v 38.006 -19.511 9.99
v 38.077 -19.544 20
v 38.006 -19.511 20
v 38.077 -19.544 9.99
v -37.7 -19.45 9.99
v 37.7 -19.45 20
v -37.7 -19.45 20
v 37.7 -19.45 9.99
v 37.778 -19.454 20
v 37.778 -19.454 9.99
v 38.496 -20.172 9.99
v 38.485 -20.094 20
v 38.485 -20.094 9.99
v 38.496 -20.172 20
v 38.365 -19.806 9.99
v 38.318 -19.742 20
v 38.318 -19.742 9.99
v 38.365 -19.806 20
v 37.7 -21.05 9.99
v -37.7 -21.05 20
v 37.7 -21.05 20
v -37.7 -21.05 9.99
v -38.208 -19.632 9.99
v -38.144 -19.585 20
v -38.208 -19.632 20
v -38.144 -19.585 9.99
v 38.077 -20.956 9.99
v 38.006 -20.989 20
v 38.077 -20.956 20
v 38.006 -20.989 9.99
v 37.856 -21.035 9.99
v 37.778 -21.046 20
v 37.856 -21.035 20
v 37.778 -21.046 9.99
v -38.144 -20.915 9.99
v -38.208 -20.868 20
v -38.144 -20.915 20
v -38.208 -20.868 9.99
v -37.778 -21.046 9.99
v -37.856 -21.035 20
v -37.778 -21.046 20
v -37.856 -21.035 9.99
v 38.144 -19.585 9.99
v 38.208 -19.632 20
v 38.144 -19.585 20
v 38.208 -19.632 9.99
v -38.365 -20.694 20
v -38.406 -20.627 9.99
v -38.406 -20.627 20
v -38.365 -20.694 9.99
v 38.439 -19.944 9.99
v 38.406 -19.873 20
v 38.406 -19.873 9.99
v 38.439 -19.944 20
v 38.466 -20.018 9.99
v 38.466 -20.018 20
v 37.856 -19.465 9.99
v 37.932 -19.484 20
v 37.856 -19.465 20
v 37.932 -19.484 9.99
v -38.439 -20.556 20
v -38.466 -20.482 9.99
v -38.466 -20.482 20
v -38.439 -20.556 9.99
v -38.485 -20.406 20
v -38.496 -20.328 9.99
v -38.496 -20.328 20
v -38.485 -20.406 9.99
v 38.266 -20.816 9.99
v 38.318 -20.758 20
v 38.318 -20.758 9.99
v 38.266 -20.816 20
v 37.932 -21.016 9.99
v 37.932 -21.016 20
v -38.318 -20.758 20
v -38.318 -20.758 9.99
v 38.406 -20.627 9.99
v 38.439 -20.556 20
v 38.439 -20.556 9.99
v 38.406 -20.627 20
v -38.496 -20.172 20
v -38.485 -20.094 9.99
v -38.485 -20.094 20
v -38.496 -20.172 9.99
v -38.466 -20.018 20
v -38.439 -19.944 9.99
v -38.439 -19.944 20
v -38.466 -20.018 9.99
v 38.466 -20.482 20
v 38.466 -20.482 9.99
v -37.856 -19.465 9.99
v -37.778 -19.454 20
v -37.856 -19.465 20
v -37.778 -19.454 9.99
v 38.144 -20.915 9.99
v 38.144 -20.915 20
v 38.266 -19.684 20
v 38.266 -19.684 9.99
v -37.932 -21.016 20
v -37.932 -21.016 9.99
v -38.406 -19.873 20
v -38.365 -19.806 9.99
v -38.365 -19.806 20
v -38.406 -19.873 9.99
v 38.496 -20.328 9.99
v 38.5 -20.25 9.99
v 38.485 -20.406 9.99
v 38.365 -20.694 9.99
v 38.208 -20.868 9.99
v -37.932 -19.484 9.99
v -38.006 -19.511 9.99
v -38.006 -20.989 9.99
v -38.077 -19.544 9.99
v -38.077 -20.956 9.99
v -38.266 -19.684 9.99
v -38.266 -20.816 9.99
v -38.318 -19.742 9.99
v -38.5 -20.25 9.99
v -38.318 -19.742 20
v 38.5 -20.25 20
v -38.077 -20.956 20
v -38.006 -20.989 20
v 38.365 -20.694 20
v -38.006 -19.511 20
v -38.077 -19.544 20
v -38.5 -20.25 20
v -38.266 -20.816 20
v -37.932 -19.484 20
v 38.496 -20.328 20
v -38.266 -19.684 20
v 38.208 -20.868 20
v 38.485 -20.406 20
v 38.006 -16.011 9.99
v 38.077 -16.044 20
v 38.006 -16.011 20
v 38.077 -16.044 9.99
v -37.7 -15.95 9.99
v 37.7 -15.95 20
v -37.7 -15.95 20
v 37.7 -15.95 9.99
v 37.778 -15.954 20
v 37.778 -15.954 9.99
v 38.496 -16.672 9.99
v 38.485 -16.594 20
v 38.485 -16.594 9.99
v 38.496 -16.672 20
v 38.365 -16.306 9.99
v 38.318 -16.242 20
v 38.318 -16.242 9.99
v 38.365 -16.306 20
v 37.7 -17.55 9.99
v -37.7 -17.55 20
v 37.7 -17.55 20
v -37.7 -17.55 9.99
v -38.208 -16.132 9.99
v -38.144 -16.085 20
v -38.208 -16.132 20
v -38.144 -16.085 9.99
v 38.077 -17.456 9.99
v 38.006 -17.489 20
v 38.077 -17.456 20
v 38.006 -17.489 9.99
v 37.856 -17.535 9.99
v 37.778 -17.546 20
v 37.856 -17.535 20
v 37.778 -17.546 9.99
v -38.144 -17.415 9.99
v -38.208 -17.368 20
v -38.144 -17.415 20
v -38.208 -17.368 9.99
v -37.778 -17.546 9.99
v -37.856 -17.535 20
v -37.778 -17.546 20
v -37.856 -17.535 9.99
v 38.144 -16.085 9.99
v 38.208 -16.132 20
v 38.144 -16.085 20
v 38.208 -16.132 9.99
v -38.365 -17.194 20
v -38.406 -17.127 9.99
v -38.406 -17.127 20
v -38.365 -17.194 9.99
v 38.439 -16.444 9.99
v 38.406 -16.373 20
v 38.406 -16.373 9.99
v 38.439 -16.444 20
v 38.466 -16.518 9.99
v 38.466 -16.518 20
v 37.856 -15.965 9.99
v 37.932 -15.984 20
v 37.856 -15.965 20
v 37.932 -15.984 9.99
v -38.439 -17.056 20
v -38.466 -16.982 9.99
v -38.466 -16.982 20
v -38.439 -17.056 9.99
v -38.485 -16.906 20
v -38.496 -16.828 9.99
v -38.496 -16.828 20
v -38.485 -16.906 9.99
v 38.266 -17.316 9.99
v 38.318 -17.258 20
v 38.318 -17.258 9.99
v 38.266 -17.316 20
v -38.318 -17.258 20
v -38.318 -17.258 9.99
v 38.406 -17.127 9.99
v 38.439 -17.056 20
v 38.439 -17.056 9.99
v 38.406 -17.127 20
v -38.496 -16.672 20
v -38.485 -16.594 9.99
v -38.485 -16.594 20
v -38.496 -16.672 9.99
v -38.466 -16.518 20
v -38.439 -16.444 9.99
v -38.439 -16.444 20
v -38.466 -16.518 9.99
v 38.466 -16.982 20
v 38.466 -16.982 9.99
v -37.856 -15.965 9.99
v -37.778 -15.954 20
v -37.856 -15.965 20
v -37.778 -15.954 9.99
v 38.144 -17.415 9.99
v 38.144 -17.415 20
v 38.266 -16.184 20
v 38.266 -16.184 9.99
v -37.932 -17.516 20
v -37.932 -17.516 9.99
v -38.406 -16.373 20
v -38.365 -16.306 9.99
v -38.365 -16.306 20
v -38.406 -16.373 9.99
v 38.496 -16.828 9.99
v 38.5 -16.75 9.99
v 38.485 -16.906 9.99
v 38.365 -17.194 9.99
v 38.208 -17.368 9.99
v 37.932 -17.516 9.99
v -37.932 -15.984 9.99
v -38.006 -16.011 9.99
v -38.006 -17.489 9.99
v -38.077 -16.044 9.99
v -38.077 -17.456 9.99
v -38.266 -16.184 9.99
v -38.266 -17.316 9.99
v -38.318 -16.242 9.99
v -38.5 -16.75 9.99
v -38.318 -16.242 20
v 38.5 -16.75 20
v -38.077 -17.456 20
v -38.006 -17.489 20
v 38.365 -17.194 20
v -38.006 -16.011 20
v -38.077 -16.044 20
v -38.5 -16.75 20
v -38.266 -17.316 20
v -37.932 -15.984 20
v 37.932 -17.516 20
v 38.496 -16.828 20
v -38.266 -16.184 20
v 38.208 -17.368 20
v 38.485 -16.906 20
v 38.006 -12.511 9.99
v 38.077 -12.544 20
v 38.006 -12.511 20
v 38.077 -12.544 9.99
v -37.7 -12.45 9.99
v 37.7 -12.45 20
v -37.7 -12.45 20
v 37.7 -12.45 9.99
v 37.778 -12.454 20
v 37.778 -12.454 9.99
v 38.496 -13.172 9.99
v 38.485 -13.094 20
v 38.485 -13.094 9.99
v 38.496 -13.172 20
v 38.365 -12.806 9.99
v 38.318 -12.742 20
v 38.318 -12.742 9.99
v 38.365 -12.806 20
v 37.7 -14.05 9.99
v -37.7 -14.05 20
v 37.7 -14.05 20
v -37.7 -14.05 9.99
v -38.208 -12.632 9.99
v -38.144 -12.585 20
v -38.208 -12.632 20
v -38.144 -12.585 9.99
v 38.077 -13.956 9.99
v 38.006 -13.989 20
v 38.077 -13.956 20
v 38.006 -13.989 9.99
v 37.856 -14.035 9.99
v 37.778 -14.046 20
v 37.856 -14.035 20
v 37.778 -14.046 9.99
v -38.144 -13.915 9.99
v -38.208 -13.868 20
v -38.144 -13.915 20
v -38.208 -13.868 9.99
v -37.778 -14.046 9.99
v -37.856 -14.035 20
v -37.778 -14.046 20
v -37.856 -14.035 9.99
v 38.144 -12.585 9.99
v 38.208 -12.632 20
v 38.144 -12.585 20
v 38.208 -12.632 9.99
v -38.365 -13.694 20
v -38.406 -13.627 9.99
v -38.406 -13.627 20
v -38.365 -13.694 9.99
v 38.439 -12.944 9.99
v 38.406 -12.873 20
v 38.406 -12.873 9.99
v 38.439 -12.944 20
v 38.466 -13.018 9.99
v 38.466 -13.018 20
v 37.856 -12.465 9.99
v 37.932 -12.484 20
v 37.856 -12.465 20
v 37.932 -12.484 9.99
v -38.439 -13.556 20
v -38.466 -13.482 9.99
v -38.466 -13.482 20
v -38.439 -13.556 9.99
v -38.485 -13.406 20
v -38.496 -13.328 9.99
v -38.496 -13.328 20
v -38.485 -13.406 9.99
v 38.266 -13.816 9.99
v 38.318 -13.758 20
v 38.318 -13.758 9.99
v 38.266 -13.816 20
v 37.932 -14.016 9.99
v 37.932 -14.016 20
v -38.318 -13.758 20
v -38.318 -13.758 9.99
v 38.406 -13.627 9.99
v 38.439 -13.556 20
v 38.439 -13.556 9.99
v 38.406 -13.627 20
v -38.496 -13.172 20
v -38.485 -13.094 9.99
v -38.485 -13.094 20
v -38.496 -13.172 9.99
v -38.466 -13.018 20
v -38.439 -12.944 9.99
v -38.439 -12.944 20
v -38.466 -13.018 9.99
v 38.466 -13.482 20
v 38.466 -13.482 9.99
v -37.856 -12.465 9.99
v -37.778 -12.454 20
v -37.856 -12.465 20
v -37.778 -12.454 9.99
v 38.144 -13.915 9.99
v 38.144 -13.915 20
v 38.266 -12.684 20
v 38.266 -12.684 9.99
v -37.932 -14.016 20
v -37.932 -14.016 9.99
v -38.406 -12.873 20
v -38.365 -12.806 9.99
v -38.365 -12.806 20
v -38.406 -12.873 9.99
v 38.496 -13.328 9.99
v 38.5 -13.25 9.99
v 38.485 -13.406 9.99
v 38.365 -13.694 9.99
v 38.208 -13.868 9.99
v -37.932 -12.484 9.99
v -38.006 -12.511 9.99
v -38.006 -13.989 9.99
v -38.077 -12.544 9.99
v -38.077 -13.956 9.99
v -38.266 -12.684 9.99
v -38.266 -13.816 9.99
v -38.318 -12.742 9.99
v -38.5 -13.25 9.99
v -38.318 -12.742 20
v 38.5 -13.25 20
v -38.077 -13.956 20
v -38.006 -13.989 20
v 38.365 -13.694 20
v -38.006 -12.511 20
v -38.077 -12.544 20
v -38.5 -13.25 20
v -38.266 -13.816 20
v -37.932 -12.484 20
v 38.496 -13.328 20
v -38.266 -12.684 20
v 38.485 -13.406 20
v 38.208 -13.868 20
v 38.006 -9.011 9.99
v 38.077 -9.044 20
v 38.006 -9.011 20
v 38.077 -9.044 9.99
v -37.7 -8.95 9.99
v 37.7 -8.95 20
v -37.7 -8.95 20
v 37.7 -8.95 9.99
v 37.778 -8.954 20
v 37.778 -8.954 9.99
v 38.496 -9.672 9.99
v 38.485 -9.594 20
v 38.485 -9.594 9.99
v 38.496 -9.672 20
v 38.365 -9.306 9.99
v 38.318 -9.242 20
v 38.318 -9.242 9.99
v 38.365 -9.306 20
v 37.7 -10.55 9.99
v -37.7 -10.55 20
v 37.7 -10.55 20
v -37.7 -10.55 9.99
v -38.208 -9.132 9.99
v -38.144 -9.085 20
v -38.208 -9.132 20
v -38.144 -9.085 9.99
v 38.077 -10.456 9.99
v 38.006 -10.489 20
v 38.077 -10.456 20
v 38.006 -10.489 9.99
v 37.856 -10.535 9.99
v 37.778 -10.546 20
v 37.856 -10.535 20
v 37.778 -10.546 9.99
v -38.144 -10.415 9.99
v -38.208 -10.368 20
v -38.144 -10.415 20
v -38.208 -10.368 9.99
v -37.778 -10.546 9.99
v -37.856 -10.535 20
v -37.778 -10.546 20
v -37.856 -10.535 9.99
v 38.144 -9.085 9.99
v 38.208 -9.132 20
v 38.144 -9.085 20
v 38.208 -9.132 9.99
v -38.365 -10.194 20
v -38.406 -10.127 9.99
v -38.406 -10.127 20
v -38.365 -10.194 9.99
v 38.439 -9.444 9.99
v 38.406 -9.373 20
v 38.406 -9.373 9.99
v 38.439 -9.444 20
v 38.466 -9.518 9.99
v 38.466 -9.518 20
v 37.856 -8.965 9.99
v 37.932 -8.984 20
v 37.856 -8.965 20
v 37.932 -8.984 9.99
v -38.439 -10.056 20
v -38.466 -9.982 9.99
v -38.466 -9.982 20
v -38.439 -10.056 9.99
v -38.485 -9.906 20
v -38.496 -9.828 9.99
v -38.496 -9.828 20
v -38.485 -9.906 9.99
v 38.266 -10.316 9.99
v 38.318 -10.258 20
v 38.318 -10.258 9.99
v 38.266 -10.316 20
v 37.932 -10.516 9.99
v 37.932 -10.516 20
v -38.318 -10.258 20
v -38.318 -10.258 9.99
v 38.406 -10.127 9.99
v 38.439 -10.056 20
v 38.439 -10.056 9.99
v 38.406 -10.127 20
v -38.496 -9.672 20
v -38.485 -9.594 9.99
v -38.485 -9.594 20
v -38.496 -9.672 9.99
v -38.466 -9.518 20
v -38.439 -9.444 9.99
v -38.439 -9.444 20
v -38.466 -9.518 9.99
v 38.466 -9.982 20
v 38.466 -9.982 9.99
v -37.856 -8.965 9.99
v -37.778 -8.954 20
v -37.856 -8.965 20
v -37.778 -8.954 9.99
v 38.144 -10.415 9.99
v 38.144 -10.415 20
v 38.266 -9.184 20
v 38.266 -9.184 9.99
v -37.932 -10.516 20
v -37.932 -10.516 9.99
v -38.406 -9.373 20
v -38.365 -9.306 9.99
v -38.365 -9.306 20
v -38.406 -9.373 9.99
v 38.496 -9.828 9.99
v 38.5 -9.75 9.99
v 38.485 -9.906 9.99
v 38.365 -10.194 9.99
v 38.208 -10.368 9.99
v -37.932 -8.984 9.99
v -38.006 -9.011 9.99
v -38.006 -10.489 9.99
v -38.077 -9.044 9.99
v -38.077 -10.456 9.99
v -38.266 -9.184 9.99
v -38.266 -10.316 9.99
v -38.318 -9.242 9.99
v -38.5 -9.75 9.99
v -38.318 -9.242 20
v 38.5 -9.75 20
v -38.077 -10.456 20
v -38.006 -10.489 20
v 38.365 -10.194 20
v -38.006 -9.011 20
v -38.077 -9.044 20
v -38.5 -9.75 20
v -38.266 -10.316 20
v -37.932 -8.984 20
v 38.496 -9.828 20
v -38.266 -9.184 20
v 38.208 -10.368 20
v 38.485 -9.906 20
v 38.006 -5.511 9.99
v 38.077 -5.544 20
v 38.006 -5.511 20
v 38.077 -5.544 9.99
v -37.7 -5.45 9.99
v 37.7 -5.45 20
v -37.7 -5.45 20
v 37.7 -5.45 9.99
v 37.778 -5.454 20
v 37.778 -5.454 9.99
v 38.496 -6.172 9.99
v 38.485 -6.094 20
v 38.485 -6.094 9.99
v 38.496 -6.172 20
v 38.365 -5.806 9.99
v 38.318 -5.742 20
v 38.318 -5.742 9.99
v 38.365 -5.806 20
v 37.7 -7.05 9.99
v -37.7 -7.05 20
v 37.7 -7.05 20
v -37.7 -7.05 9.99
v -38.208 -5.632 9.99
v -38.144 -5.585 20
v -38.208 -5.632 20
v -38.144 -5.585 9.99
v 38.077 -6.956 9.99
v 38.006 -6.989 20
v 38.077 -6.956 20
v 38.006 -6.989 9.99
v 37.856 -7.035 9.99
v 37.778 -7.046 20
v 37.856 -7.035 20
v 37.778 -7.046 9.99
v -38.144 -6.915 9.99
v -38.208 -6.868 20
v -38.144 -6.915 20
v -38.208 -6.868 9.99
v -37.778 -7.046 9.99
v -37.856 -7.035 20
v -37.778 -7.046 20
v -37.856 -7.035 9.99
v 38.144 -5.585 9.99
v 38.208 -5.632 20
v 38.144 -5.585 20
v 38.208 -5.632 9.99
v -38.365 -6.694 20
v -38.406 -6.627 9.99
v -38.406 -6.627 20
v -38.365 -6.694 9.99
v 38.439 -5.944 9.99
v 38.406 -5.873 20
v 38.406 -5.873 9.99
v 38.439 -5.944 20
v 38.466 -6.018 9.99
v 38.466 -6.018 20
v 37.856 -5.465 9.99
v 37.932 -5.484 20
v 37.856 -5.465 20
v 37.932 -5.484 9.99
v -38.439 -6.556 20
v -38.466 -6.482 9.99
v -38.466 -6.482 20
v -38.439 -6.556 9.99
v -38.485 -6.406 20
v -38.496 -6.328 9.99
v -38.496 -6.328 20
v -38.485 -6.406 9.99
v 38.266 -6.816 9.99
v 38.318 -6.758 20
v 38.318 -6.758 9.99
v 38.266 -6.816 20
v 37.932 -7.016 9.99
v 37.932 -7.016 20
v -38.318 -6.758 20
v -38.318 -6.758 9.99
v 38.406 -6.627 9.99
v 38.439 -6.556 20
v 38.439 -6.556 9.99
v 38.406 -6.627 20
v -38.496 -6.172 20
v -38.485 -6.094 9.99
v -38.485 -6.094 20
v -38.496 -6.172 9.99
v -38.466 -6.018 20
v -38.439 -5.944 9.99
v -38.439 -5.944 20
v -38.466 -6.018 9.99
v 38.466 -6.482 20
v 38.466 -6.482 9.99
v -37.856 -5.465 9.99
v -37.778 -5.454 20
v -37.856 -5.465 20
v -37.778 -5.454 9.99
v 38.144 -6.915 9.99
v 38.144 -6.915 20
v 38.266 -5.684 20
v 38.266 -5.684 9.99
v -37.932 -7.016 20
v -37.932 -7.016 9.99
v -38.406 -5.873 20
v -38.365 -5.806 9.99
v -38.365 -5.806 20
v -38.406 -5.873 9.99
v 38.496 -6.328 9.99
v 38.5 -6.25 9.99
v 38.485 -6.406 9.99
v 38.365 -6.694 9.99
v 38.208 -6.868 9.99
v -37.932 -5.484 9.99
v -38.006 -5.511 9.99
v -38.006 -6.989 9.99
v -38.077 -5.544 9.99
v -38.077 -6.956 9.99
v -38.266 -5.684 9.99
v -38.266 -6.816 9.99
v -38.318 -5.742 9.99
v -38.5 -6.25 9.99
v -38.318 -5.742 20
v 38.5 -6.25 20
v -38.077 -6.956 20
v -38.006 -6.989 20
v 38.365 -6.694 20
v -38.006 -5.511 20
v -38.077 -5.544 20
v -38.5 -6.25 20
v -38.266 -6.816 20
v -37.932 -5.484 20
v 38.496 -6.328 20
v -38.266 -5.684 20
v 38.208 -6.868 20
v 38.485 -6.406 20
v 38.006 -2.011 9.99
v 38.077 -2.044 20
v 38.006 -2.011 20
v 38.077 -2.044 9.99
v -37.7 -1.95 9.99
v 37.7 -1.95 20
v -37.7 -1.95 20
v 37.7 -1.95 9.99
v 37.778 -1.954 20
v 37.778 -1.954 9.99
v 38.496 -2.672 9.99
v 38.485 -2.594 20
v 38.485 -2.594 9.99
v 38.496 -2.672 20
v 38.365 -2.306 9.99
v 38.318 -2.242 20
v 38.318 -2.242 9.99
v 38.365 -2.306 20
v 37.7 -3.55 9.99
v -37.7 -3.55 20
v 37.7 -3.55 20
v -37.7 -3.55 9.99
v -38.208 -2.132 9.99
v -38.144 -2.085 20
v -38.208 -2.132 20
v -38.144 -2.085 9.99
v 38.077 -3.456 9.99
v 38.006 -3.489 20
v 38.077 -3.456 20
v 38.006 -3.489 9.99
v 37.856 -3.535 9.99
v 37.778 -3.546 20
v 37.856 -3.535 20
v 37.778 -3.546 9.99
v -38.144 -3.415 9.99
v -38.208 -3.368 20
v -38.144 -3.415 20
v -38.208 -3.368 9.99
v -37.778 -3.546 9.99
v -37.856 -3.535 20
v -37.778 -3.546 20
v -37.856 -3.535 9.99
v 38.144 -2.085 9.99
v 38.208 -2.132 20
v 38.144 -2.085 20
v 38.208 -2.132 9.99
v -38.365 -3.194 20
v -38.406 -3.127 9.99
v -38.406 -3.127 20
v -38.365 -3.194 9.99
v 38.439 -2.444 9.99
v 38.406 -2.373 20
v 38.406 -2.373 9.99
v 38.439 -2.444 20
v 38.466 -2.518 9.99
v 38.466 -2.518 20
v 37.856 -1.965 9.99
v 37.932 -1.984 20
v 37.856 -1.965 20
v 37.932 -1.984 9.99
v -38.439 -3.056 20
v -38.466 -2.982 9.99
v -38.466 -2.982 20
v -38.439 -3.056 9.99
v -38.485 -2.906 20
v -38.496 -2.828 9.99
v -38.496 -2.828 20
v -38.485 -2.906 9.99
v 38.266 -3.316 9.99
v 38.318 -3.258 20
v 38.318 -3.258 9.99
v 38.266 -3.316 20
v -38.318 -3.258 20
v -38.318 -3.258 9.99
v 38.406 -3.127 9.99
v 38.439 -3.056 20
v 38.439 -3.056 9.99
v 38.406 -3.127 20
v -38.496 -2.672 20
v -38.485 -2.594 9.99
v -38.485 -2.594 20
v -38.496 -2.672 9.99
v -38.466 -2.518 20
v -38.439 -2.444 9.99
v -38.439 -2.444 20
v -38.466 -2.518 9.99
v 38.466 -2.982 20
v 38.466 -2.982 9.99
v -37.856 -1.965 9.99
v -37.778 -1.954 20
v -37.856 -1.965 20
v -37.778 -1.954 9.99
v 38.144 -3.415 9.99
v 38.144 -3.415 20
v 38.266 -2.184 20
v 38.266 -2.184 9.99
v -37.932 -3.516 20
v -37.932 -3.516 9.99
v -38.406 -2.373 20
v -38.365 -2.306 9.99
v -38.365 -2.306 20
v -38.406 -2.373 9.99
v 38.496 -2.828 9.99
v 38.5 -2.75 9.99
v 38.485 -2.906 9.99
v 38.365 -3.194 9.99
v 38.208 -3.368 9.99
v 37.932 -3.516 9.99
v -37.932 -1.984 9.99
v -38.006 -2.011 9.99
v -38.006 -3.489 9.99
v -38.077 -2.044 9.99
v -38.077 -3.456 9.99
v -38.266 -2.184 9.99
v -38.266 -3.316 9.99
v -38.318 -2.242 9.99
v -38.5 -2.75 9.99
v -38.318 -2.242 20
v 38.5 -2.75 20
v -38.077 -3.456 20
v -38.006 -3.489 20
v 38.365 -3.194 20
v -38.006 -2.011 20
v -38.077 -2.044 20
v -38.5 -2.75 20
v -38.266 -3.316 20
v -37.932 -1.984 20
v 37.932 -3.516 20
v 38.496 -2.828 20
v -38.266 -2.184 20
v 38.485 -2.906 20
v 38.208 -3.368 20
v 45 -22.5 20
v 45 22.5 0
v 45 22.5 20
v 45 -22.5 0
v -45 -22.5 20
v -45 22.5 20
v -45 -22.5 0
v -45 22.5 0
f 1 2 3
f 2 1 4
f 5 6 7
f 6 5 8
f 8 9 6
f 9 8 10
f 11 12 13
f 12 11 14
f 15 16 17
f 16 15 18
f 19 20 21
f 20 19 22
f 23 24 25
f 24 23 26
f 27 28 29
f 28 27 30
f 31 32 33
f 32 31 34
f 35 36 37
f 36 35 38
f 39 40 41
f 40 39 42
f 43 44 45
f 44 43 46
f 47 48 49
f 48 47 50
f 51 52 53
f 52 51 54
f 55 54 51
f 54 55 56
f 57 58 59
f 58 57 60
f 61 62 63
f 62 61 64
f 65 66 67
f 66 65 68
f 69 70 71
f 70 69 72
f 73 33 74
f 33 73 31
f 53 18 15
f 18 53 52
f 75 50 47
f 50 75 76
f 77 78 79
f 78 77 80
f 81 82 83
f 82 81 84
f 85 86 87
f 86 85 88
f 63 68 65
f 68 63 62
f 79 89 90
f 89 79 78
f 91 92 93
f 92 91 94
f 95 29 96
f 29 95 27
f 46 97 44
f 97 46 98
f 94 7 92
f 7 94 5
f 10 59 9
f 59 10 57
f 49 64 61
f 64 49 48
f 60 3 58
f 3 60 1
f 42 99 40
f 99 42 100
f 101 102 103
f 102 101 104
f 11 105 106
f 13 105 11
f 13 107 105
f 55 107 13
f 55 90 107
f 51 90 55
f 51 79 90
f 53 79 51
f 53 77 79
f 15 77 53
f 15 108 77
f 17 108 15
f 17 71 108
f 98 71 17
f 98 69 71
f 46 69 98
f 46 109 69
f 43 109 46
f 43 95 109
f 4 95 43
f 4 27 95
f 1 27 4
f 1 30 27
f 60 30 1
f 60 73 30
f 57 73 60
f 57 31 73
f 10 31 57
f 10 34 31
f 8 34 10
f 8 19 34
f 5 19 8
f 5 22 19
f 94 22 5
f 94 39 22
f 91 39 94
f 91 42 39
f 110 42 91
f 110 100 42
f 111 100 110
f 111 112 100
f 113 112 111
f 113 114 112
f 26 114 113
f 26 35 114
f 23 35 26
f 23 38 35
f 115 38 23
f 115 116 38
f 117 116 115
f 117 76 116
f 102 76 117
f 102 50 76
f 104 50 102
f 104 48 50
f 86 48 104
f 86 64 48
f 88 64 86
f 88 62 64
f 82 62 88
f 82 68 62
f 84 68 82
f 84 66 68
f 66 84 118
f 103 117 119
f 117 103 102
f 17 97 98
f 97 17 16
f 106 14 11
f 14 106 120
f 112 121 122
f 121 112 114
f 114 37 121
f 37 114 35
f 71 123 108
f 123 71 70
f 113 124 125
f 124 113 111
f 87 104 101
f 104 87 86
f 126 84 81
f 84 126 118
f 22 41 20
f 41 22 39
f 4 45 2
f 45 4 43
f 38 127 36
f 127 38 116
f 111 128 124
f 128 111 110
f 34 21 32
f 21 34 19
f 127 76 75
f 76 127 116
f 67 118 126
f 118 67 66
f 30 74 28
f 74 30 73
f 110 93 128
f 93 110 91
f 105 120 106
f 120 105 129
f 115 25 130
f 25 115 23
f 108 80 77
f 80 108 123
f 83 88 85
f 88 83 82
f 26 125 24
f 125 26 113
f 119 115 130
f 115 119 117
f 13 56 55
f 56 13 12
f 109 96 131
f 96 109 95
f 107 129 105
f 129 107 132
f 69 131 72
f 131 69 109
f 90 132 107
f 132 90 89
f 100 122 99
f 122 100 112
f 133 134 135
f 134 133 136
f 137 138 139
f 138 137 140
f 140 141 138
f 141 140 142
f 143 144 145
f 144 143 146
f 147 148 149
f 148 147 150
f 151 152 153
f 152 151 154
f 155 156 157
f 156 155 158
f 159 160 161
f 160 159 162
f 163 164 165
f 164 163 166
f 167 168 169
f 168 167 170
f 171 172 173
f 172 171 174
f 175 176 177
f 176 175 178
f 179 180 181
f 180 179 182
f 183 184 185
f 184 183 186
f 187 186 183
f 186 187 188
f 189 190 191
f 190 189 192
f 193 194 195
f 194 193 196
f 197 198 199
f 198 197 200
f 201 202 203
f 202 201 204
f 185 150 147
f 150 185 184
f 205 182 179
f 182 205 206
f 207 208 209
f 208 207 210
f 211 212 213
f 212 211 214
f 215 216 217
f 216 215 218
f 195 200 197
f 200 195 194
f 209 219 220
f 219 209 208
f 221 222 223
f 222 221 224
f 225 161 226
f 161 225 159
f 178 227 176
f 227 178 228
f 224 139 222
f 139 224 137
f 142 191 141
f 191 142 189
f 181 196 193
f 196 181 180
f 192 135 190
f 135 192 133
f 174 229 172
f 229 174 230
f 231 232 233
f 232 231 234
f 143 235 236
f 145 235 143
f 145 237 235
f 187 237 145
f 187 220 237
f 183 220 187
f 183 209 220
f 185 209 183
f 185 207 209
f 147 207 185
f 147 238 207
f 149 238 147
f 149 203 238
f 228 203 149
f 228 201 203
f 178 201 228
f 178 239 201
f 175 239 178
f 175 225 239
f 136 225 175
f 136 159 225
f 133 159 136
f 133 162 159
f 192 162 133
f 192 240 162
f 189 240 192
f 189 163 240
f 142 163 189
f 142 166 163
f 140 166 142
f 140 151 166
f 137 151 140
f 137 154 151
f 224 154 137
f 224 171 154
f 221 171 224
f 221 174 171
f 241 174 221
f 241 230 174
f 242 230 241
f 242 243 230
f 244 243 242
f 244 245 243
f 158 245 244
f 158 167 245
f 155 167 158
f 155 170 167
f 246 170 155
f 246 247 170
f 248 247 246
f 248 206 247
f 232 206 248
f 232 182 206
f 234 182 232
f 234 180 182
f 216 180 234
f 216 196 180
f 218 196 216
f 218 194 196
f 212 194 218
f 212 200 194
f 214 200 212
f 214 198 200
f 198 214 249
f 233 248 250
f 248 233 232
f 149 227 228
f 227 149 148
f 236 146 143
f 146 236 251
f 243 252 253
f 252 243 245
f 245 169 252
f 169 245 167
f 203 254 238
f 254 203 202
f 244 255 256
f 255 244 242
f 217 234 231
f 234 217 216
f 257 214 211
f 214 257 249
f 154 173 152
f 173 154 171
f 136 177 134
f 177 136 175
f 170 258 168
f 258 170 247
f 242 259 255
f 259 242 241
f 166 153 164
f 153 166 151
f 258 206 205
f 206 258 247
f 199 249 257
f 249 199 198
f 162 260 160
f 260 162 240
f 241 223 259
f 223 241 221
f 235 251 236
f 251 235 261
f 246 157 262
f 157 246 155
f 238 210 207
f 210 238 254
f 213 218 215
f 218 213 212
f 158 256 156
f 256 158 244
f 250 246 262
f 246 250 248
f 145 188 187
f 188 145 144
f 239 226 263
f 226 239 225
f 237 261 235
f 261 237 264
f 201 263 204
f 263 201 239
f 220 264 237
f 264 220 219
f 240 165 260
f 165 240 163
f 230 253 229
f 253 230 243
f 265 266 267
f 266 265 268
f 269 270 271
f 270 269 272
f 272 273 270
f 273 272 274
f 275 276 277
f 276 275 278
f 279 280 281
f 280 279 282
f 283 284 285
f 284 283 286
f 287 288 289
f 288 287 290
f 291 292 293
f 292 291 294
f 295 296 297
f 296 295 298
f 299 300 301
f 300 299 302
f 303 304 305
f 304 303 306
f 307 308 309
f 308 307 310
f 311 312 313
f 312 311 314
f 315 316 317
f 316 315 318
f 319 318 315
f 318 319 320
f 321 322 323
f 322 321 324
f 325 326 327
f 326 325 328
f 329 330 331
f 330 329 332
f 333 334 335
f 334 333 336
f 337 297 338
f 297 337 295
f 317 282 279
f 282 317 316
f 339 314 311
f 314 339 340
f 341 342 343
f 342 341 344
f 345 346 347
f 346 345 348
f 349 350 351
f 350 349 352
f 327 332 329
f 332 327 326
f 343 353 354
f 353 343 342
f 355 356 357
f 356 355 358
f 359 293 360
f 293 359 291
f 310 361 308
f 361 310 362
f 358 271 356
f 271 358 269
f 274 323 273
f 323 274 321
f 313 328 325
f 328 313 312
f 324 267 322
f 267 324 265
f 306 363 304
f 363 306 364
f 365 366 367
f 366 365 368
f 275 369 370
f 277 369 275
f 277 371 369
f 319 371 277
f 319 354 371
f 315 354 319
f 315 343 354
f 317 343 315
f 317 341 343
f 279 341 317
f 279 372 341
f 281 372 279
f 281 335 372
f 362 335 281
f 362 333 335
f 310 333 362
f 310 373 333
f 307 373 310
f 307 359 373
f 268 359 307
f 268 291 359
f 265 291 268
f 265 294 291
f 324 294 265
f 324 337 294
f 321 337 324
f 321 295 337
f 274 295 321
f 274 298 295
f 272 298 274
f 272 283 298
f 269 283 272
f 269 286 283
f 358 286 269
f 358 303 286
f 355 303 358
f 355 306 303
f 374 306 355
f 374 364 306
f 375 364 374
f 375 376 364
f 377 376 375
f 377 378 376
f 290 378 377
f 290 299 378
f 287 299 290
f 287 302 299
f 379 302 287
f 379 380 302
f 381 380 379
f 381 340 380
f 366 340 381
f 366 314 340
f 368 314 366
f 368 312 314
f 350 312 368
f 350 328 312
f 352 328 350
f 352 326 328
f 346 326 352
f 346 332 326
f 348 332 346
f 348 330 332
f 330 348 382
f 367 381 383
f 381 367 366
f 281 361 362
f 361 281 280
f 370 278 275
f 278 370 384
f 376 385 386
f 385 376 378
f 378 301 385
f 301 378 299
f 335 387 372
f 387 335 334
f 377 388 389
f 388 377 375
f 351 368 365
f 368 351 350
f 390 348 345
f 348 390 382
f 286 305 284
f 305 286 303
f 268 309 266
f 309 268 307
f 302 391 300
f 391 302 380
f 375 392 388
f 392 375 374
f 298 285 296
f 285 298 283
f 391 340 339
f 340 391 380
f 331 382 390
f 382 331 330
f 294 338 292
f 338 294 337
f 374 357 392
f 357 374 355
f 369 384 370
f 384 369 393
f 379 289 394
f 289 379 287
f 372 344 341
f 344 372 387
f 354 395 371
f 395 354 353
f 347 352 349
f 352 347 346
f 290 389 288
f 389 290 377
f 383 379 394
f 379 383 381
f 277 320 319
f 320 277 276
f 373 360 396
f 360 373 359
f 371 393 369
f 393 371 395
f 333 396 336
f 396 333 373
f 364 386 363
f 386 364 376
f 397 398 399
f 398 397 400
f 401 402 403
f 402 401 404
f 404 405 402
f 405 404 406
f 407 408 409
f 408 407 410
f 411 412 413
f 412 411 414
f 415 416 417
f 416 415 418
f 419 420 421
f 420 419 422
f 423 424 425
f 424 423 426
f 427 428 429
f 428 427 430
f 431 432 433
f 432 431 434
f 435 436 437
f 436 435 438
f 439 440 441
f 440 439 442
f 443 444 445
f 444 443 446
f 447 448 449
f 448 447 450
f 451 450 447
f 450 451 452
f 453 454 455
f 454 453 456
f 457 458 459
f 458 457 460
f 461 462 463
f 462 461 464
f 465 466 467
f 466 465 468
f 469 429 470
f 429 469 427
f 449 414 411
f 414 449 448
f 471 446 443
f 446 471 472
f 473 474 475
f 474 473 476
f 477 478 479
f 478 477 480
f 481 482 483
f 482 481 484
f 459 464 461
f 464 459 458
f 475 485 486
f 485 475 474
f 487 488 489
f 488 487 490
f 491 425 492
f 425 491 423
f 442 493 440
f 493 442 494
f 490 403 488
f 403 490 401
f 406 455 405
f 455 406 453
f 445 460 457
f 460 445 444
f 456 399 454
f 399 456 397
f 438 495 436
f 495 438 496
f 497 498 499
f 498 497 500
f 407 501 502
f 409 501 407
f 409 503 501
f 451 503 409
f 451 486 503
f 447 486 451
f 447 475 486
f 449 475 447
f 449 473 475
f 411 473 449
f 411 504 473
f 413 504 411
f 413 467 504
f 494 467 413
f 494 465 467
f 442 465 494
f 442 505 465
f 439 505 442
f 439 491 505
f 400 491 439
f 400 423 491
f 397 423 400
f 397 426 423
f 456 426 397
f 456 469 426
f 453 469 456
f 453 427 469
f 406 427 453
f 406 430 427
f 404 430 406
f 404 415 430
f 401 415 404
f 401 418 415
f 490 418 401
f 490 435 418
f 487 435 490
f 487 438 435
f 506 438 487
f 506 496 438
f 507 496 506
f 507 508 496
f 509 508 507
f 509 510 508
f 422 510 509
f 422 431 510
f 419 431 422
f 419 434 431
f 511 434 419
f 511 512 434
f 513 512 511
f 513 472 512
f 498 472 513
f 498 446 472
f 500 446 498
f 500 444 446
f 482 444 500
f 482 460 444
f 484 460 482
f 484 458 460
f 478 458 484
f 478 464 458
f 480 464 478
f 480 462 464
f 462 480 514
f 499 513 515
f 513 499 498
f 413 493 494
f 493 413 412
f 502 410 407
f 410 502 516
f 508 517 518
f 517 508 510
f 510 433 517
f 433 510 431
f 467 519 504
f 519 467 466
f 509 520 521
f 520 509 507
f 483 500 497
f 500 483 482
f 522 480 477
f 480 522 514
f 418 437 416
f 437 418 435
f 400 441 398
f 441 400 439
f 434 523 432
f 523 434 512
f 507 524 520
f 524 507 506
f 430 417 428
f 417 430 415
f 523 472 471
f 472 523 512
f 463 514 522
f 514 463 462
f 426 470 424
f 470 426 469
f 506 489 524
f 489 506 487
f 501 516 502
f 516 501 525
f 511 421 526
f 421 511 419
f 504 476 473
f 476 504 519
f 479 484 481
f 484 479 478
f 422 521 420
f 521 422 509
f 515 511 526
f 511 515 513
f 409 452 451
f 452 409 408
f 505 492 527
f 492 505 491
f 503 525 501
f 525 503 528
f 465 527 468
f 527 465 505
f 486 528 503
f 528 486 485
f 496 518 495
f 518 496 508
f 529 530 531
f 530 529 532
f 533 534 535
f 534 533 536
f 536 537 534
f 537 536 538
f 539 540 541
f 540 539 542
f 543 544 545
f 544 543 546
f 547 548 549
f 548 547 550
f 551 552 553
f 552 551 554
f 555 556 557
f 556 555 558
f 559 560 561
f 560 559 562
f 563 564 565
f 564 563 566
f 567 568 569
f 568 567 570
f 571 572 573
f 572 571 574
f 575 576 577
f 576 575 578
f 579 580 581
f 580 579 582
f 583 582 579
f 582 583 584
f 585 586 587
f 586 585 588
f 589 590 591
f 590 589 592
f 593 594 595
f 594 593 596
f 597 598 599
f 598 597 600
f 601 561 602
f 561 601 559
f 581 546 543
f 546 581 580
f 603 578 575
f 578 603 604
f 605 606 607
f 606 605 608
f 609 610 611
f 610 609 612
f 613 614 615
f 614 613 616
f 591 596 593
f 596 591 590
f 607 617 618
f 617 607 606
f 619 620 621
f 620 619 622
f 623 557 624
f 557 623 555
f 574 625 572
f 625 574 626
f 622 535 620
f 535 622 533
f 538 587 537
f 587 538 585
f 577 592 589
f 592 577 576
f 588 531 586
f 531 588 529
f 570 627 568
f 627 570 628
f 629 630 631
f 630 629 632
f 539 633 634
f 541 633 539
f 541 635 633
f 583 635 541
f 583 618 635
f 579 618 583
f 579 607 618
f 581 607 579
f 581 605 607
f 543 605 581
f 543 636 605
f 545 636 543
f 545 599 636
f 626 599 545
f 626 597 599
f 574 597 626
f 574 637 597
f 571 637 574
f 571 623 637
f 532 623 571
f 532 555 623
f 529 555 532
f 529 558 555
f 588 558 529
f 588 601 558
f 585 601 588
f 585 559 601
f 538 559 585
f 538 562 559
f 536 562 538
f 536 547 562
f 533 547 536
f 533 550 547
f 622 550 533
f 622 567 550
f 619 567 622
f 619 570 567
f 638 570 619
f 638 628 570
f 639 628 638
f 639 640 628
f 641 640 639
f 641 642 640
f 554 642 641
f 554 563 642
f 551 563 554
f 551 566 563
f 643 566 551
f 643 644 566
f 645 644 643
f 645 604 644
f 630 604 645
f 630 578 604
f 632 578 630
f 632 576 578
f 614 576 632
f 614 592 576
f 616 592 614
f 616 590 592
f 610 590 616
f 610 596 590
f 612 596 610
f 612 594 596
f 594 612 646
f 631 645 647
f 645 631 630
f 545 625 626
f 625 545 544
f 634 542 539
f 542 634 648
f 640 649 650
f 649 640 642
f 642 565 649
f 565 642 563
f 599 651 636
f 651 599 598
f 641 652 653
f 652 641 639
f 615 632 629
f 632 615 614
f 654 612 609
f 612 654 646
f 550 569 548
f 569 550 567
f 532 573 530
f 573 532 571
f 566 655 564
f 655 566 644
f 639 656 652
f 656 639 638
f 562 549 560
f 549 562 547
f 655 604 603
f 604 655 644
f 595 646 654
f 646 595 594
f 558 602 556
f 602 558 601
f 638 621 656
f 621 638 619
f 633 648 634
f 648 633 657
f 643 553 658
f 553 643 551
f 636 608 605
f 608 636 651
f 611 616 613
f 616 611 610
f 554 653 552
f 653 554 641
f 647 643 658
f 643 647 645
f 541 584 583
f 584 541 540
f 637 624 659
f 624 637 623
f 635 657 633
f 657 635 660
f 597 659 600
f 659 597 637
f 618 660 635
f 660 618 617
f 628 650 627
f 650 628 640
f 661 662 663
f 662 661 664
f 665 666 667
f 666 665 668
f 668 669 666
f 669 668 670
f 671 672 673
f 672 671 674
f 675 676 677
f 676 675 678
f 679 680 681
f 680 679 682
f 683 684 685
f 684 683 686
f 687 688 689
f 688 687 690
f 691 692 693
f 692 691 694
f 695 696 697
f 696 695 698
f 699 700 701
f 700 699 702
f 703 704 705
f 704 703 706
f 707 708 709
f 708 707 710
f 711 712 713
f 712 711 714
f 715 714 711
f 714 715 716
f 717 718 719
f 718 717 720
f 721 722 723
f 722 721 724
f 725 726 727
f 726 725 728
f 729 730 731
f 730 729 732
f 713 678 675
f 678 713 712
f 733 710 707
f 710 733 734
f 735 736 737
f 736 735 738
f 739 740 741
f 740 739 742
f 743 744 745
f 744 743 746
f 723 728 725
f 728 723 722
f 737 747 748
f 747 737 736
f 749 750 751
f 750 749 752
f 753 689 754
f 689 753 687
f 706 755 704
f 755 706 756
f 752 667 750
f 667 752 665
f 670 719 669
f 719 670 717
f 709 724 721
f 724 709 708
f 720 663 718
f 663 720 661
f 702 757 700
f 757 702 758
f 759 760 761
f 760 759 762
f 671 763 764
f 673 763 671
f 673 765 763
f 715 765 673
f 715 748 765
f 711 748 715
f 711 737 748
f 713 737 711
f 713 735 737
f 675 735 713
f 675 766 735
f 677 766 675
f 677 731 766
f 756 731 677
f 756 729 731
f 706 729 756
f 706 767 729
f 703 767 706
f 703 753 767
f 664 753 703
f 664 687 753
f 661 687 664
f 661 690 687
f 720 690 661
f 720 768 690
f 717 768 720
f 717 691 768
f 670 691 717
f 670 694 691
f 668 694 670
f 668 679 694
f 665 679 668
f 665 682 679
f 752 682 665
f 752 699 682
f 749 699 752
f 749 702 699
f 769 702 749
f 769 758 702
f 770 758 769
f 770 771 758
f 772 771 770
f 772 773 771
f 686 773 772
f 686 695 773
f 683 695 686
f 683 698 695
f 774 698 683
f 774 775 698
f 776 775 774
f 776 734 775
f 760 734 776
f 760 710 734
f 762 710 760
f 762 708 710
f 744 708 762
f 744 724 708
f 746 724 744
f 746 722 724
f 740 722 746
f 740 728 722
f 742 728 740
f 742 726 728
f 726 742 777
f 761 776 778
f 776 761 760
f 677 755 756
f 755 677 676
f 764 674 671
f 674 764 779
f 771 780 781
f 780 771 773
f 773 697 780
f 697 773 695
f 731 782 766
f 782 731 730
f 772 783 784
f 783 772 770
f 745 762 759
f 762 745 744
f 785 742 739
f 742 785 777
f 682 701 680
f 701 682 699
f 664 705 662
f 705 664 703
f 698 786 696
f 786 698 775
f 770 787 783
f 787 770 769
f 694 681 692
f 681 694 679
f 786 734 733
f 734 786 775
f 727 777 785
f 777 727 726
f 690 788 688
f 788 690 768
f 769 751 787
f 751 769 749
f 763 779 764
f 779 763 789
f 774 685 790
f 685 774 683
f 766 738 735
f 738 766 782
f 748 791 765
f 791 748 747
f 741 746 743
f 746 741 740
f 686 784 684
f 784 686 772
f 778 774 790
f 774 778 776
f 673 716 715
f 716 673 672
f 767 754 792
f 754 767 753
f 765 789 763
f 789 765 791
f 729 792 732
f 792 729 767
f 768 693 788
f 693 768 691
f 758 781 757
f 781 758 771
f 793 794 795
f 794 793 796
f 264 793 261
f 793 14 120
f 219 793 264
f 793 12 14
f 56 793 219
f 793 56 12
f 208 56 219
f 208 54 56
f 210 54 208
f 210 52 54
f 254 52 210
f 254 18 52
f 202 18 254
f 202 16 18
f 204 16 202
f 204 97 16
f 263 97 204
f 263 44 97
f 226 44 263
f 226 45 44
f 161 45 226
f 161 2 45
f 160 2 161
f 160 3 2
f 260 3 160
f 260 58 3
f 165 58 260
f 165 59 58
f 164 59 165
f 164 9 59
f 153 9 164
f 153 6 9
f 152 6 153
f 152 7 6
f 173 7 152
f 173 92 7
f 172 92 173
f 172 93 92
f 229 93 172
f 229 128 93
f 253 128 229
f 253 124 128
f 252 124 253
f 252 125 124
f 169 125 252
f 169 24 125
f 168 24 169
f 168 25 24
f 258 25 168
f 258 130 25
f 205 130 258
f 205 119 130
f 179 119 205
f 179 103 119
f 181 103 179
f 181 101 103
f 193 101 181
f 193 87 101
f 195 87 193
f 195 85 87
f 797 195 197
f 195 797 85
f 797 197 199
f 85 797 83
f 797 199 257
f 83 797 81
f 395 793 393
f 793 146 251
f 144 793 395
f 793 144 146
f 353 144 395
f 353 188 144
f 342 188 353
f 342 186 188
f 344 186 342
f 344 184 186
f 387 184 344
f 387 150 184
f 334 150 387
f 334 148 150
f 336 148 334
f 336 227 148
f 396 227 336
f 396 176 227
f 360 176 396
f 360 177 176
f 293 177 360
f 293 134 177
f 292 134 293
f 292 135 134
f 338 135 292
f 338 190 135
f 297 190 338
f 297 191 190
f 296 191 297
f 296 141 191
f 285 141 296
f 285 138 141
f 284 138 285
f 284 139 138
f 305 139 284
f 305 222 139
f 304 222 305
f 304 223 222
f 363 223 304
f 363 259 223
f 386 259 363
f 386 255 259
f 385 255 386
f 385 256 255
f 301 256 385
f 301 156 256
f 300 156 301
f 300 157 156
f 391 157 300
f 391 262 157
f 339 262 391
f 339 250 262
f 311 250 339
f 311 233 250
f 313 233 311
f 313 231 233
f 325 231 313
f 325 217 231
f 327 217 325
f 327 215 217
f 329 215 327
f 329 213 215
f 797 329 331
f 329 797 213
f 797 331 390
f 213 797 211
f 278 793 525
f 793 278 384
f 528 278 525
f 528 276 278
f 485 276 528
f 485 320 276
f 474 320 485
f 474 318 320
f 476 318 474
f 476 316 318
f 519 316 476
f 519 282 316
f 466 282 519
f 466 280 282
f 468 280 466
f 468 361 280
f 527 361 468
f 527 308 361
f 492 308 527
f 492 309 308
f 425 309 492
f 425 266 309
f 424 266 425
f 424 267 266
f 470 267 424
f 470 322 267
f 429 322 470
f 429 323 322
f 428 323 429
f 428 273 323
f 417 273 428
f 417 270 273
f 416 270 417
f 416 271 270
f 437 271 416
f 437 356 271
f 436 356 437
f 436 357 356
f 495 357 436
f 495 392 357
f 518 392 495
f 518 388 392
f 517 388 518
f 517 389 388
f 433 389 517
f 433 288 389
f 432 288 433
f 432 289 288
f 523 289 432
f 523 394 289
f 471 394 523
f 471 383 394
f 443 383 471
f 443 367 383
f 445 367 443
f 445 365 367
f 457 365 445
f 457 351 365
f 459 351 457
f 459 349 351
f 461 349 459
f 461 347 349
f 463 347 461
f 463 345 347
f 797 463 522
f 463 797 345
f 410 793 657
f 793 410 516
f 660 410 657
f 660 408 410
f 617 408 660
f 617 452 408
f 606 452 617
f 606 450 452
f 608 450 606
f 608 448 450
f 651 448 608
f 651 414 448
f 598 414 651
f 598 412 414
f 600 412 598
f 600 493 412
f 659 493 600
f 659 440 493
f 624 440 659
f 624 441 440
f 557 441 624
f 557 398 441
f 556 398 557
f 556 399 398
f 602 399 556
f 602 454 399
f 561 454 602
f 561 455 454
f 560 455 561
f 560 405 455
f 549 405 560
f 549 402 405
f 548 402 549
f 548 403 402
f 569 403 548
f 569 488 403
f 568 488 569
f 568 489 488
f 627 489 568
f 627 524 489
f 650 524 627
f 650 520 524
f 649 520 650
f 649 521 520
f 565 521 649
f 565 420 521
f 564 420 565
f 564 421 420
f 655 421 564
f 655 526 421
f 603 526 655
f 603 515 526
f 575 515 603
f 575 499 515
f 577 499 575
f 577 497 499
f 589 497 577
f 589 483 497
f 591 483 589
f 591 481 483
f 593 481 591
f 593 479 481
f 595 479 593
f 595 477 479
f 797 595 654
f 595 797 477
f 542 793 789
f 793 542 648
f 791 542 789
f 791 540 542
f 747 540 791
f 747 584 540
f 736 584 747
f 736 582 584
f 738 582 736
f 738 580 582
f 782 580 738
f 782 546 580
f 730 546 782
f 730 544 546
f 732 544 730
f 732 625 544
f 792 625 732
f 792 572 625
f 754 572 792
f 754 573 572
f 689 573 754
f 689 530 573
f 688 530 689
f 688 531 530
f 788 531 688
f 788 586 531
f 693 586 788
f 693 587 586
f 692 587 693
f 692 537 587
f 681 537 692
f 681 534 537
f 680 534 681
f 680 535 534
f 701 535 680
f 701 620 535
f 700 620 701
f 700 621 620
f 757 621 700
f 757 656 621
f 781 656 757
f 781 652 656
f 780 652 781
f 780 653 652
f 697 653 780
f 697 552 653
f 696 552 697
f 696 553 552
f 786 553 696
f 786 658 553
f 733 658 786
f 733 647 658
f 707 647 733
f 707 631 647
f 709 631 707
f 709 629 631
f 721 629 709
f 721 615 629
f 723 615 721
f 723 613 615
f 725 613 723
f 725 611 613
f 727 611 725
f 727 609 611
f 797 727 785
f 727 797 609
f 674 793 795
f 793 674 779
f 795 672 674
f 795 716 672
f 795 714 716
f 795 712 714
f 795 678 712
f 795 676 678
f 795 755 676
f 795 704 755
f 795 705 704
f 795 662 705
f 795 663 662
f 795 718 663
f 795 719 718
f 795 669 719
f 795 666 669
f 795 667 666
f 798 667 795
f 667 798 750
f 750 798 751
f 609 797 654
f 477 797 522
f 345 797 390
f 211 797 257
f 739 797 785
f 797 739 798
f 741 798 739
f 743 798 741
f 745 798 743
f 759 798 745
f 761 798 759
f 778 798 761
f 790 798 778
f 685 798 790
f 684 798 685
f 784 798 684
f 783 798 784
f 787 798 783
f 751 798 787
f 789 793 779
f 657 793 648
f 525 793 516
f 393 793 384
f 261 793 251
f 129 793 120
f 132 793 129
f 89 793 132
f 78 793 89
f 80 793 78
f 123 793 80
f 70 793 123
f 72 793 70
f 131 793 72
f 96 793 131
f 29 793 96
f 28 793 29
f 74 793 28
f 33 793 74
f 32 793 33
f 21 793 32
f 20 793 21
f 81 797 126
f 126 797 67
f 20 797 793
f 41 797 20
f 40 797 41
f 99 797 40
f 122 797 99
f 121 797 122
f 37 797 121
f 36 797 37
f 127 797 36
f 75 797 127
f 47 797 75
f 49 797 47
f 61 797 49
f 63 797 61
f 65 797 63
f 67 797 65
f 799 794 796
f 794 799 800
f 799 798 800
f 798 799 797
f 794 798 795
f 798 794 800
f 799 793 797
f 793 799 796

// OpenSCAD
// Built by bench/smallmodels/features/compiler.py from a list of features.
$fn = 64;
difference() {
  union() {
    translate([0, 0, 0]) translate([-45, -22.5, 0]) cube([90, 45, 20]);
  }
  union() {
    translate([0, -34.25, 9.99]) rotate([0, 0, 0]) hull() { for (s = [-1, 1]) translate([s * 37.7, 0, 0]) cylinder(d = 1.6, h = 10.02); }
    translate([0, -30.75, 9.99]) rotate([0, 0, 0]) hull() { for (s = [-1, 1]) translate([s * 37.7, 0, 0]) cylinder(d = 1.6, h = 10.02); }
    translate([0, -27.25, 9.99]) rotate([0, 0, 0]) hull() { for (s = [-1, 1]) translate([s * 37.7, 0, 0]) cylinder(d = 1.6, h = 10.02); }
    translate([0, -23.75, 9.99]) rotate([0, 0, 0]) hull() { for (s = [-1, 1]) translate([s * 37.7, 0, 0]) cylinder(d = 1.6, h = 10.02); }
    translate([0, -20.25, 9.99]) rotate([0, 0, 0]) hull() { for (s = [-1, 1]) translate([s * 37.7, 0, 0]) cylinder(d = 1.6, h = 10.02); }
    translate([0, -16.75, 9.99]) rotate([0, 0, 0]) hull() { for (s = [-1, 1]) translate([s * 37.7, 0, 0]) cylinder(d = 1.6, h = 10.02); }
    translate([0, -13.25, 9.99]) rotate([0, 0, 0]) hull() { for (s = [-1, 1]) translate([s * 37.7, 0, 0]) cylinder(d = 1.6, h = 10.02); }
    translate([0, -9.75, 9.99]) rotate([0, 0, 0]) hull() { for (s = [-1, 1]) translate([s * 37.7, 0, 0]) cylinder(d = 1.6, h = 10.02); }
    translate([0, -6.25, 9.99]) rotate([0, 0, 0]) hull() { for (s = [-1, 1]) translate([s * 37.7, 0, 0]) cylinder(d = 1.6, h = 10.02); }
    translate([0, -2.75, 9.99]) rotate([0, 0, 0]) hull() { for (s = [-1, 1]) translate([s * 37.7, 0, 0]) cylinder(d = 1.6, h = 10.02); }
  }
}
